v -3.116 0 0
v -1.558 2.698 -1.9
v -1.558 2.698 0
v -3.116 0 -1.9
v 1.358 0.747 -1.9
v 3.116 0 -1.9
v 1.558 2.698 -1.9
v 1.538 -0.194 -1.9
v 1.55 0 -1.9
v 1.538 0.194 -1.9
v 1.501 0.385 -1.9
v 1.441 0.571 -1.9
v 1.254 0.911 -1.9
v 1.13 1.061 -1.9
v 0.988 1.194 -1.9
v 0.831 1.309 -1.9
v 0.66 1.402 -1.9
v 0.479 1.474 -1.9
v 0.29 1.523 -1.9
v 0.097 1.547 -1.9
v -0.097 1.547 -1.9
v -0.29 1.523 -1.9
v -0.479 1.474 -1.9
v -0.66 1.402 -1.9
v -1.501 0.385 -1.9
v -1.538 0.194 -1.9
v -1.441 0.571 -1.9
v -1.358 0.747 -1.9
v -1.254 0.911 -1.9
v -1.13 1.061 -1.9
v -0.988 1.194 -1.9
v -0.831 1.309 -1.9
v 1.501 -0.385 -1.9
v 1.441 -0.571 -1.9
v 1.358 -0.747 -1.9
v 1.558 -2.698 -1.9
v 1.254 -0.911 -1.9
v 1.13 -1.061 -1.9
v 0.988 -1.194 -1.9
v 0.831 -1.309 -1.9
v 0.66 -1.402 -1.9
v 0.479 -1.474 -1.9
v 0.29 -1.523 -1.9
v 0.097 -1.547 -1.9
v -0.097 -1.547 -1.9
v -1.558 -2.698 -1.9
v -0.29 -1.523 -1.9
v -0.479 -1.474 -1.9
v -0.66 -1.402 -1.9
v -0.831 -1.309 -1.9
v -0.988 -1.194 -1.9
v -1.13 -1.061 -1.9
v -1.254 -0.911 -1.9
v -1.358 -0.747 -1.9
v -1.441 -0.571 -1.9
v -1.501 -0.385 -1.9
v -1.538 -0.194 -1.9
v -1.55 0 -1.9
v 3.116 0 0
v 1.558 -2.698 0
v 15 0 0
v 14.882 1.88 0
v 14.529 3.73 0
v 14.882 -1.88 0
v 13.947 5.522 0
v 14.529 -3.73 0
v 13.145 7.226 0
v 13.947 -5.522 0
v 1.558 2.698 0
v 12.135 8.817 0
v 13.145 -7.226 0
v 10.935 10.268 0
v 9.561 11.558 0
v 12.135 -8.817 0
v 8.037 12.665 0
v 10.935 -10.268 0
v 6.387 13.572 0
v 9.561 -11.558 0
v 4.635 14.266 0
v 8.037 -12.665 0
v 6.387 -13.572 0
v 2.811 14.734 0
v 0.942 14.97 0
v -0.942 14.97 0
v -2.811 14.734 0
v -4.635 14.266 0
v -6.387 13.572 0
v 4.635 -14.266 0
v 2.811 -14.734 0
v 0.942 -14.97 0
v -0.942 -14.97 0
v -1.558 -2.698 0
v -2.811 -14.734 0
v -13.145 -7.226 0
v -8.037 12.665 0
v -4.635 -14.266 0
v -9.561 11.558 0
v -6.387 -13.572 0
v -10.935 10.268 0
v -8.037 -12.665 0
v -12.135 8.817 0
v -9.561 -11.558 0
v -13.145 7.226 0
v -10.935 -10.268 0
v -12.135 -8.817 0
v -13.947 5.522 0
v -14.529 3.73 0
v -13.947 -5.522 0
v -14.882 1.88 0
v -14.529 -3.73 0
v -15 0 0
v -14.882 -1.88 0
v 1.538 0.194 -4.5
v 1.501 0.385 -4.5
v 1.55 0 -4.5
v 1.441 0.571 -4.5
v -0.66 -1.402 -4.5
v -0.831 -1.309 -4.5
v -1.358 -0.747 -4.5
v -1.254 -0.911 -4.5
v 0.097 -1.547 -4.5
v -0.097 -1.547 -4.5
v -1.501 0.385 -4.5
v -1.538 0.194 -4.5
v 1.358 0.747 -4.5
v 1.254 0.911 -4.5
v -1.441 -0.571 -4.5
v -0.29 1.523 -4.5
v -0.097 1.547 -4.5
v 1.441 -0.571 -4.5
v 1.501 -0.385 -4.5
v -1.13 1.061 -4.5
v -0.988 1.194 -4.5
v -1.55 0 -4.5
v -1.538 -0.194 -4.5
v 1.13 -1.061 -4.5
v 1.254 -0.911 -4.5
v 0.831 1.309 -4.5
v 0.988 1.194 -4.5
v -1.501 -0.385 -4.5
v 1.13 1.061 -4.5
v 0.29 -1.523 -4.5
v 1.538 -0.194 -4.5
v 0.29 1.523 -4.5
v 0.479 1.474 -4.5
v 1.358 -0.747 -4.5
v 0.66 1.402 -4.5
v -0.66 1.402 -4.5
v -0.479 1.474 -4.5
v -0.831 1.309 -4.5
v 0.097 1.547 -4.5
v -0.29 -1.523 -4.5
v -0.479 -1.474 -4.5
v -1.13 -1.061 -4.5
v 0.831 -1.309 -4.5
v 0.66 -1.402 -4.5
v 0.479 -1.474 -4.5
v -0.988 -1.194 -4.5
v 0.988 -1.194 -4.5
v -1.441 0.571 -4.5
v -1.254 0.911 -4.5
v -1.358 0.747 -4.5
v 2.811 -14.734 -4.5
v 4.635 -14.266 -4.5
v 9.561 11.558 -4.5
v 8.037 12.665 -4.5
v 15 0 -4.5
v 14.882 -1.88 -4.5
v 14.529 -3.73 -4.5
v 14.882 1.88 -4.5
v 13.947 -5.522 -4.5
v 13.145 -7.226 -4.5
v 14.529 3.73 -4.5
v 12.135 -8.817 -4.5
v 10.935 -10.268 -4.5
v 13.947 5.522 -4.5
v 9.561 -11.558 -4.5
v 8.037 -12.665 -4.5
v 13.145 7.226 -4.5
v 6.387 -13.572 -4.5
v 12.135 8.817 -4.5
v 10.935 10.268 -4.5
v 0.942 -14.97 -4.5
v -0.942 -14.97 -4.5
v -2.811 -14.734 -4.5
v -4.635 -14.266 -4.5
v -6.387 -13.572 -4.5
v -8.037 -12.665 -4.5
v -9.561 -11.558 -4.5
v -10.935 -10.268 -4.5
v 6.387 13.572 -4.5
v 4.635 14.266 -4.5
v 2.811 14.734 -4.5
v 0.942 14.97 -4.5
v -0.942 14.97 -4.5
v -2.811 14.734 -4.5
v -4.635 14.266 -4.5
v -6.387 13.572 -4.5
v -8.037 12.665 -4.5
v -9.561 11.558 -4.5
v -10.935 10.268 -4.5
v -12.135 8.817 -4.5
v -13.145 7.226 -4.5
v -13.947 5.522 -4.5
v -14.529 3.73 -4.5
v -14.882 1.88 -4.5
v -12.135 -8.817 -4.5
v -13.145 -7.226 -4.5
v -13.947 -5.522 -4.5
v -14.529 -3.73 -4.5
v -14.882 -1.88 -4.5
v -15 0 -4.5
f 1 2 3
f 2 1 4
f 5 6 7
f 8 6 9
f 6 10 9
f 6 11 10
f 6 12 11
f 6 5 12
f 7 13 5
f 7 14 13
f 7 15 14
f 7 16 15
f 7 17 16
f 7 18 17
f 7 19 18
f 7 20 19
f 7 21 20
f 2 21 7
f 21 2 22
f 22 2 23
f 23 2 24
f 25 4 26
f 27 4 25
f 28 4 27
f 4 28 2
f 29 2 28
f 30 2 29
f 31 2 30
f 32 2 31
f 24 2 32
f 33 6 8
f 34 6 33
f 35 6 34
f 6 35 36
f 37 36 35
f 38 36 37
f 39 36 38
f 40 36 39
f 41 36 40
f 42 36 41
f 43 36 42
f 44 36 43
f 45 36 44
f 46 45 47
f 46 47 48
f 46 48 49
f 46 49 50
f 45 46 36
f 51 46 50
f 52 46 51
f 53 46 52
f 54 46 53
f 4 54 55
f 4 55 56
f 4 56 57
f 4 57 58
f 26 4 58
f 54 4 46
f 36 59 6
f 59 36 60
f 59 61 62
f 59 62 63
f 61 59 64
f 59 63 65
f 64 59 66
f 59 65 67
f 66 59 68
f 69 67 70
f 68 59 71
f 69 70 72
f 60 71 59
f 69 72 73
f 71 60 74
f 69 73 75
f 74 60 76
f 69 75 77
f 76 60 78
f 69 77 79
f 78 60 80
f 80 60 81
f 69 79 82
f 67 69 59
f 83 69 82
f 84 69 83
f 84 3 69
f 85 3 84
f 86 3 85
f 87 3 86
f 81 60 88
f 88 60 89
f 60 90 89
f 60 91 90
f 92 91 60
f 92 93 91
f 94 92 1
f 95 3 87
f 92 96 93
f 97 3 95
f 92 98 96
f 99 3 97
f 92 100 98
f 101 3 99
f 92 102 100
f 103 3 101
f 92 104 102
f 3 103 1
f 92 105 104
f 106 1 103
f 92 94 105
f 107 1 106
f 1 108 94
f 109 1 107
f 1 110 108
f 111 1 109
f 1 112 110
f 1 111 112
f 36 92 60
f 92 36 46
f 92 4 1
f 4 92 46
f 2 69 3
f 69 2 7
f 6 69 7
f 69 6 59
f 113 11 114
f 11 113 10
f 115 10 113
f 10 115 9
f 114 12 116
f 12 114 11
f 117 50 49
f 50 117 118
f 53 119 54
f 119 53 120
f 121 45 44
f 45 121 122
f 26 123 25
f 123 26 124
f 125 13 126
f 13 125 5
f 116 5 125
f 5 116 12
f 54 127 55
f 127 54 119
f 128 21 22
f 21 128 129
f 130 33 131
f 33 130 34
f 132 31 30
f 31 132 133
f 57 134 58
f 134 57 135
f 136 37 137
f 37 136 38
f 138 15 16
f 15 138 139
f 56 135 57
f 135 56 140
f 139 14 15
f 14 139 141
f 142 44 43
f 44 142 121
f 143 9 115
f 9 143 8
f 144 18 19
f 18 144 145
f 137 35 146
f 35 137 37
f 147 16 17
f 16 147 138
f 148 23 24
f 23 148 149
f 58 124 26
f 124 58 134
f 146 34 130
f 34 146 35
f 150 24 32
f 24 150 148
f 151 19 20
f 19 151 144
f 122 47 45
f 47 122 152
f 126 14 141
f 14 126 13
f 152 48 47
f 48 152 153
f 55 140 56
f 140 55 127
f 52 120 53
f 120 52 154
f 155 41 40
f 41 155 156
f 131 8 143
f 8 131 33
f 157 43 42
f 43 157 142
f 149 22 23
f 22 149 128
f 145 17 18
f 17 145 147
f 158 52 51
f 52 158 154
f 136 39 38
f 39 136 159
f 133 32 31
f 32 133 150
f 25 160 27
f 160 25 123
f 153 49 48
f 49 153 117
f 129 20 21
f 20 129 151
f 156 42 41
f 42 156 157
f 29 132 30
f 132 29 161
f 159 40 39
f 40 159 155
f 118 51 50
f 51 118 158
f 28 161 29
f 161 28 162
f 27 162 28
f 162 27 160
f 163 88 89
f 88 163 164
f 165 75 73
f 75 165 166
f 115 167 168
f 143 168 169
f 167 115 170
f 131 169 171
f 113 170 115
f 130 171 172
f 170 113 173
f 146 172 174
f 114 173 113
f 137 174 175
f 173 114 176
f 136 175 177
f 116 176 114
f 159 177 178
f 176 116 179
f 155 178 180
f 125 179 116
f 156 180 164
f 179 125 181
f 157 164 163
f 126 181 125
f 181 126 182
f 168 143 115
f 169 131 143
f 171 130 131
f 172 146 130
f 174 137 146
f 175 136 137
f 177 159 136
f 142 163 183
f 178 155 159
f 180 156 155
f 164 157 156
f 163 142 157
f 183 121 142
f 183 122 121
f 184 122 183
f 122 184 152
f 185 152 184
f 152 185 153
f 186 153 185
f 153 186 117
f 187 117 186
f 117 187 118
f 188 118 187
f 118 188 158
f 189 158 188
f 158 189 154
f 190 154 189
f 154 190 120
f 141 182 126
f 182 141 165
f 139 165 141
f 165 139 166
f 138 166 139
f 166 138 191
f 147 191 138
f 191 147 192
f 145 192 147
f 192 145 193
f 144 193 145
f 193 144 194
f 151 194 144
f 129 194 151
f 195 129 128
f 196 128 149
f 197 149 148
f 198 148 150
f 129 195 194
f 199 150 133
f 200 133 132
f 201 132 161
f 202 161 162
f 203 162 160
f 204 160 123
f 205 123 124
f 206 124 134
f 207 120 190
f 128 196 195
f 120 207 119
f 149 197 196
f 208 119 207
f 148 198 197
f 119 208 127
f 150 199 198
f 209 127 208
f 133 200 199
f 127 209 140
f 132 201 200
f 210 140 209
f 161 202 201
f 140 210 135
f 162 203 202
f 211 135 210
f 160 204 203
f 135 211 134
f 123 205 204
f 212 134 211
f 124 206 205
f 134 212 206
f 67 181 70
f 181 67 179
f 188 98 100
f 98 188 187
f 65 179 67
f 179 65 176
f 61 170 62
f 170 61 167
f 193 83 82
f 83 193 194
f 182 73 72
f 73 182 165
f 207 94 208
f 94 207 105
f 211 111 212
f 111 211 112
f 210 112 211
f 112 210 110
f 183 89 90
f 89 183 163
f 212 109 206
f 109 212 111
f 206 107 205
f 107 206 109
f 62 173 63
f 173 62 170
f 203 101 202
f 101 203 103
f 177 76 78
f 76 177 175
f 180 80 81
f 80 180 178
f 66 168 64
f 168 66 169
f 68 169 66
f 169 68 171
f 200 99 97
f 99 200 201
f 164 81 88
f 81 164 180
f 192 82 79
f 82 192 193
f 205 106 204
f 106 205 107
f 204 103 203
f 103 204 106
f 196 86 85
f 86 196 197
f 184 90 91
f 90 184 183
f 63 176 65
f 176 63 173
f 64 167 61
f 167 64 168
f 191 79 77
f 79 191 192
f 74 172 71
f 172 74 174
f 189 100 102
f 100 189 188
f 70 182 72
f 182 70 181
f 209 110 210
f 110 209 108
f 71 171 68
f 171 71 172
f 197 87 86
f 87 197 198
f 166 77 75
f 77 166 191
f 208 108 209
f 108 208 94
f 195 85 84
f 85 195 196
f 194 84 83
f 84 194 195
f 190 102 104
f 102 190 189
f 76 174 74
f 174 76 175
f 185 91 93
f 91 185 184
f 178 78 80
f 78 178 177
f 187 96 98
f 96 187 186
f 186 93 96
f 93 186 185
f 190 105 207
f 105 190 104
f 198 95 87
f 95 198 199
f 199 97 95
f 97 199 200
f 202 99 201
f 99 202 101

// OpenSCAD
$fn = 50;


difference() {
	union() {
		translate(v = [0, 0, -4.5000000000]) {
			cylinder(h = 4.5000000000, r = 15.0000000000);
		}
	}
	union() {
		translate(v = [0, 0, 0]) {
			rotate(a = [0, 0, 0]) {
				difference() {
					union() {
						translate(v = [0, 0, -1.9000000000]) {
							linear_extrude(height = 1.9000000000) {
								polygon(points = [[3.1158000000, 0.0000000000], [1.5579000000, 2.6983619531], [-1.5579000000, 2.6983619531], [-3.1158000000, 0.0000000000], [-1.5579000000, -2.6983619531], [1.5579000000, -2.6983619531]]);
							}
						}
					}
					union();
				}
			}
		}
		#translate(v = [0, 0, -100.0000000000]) {
			cylinder(h = 200, r = 1.5500000000);
		}
	}
}
